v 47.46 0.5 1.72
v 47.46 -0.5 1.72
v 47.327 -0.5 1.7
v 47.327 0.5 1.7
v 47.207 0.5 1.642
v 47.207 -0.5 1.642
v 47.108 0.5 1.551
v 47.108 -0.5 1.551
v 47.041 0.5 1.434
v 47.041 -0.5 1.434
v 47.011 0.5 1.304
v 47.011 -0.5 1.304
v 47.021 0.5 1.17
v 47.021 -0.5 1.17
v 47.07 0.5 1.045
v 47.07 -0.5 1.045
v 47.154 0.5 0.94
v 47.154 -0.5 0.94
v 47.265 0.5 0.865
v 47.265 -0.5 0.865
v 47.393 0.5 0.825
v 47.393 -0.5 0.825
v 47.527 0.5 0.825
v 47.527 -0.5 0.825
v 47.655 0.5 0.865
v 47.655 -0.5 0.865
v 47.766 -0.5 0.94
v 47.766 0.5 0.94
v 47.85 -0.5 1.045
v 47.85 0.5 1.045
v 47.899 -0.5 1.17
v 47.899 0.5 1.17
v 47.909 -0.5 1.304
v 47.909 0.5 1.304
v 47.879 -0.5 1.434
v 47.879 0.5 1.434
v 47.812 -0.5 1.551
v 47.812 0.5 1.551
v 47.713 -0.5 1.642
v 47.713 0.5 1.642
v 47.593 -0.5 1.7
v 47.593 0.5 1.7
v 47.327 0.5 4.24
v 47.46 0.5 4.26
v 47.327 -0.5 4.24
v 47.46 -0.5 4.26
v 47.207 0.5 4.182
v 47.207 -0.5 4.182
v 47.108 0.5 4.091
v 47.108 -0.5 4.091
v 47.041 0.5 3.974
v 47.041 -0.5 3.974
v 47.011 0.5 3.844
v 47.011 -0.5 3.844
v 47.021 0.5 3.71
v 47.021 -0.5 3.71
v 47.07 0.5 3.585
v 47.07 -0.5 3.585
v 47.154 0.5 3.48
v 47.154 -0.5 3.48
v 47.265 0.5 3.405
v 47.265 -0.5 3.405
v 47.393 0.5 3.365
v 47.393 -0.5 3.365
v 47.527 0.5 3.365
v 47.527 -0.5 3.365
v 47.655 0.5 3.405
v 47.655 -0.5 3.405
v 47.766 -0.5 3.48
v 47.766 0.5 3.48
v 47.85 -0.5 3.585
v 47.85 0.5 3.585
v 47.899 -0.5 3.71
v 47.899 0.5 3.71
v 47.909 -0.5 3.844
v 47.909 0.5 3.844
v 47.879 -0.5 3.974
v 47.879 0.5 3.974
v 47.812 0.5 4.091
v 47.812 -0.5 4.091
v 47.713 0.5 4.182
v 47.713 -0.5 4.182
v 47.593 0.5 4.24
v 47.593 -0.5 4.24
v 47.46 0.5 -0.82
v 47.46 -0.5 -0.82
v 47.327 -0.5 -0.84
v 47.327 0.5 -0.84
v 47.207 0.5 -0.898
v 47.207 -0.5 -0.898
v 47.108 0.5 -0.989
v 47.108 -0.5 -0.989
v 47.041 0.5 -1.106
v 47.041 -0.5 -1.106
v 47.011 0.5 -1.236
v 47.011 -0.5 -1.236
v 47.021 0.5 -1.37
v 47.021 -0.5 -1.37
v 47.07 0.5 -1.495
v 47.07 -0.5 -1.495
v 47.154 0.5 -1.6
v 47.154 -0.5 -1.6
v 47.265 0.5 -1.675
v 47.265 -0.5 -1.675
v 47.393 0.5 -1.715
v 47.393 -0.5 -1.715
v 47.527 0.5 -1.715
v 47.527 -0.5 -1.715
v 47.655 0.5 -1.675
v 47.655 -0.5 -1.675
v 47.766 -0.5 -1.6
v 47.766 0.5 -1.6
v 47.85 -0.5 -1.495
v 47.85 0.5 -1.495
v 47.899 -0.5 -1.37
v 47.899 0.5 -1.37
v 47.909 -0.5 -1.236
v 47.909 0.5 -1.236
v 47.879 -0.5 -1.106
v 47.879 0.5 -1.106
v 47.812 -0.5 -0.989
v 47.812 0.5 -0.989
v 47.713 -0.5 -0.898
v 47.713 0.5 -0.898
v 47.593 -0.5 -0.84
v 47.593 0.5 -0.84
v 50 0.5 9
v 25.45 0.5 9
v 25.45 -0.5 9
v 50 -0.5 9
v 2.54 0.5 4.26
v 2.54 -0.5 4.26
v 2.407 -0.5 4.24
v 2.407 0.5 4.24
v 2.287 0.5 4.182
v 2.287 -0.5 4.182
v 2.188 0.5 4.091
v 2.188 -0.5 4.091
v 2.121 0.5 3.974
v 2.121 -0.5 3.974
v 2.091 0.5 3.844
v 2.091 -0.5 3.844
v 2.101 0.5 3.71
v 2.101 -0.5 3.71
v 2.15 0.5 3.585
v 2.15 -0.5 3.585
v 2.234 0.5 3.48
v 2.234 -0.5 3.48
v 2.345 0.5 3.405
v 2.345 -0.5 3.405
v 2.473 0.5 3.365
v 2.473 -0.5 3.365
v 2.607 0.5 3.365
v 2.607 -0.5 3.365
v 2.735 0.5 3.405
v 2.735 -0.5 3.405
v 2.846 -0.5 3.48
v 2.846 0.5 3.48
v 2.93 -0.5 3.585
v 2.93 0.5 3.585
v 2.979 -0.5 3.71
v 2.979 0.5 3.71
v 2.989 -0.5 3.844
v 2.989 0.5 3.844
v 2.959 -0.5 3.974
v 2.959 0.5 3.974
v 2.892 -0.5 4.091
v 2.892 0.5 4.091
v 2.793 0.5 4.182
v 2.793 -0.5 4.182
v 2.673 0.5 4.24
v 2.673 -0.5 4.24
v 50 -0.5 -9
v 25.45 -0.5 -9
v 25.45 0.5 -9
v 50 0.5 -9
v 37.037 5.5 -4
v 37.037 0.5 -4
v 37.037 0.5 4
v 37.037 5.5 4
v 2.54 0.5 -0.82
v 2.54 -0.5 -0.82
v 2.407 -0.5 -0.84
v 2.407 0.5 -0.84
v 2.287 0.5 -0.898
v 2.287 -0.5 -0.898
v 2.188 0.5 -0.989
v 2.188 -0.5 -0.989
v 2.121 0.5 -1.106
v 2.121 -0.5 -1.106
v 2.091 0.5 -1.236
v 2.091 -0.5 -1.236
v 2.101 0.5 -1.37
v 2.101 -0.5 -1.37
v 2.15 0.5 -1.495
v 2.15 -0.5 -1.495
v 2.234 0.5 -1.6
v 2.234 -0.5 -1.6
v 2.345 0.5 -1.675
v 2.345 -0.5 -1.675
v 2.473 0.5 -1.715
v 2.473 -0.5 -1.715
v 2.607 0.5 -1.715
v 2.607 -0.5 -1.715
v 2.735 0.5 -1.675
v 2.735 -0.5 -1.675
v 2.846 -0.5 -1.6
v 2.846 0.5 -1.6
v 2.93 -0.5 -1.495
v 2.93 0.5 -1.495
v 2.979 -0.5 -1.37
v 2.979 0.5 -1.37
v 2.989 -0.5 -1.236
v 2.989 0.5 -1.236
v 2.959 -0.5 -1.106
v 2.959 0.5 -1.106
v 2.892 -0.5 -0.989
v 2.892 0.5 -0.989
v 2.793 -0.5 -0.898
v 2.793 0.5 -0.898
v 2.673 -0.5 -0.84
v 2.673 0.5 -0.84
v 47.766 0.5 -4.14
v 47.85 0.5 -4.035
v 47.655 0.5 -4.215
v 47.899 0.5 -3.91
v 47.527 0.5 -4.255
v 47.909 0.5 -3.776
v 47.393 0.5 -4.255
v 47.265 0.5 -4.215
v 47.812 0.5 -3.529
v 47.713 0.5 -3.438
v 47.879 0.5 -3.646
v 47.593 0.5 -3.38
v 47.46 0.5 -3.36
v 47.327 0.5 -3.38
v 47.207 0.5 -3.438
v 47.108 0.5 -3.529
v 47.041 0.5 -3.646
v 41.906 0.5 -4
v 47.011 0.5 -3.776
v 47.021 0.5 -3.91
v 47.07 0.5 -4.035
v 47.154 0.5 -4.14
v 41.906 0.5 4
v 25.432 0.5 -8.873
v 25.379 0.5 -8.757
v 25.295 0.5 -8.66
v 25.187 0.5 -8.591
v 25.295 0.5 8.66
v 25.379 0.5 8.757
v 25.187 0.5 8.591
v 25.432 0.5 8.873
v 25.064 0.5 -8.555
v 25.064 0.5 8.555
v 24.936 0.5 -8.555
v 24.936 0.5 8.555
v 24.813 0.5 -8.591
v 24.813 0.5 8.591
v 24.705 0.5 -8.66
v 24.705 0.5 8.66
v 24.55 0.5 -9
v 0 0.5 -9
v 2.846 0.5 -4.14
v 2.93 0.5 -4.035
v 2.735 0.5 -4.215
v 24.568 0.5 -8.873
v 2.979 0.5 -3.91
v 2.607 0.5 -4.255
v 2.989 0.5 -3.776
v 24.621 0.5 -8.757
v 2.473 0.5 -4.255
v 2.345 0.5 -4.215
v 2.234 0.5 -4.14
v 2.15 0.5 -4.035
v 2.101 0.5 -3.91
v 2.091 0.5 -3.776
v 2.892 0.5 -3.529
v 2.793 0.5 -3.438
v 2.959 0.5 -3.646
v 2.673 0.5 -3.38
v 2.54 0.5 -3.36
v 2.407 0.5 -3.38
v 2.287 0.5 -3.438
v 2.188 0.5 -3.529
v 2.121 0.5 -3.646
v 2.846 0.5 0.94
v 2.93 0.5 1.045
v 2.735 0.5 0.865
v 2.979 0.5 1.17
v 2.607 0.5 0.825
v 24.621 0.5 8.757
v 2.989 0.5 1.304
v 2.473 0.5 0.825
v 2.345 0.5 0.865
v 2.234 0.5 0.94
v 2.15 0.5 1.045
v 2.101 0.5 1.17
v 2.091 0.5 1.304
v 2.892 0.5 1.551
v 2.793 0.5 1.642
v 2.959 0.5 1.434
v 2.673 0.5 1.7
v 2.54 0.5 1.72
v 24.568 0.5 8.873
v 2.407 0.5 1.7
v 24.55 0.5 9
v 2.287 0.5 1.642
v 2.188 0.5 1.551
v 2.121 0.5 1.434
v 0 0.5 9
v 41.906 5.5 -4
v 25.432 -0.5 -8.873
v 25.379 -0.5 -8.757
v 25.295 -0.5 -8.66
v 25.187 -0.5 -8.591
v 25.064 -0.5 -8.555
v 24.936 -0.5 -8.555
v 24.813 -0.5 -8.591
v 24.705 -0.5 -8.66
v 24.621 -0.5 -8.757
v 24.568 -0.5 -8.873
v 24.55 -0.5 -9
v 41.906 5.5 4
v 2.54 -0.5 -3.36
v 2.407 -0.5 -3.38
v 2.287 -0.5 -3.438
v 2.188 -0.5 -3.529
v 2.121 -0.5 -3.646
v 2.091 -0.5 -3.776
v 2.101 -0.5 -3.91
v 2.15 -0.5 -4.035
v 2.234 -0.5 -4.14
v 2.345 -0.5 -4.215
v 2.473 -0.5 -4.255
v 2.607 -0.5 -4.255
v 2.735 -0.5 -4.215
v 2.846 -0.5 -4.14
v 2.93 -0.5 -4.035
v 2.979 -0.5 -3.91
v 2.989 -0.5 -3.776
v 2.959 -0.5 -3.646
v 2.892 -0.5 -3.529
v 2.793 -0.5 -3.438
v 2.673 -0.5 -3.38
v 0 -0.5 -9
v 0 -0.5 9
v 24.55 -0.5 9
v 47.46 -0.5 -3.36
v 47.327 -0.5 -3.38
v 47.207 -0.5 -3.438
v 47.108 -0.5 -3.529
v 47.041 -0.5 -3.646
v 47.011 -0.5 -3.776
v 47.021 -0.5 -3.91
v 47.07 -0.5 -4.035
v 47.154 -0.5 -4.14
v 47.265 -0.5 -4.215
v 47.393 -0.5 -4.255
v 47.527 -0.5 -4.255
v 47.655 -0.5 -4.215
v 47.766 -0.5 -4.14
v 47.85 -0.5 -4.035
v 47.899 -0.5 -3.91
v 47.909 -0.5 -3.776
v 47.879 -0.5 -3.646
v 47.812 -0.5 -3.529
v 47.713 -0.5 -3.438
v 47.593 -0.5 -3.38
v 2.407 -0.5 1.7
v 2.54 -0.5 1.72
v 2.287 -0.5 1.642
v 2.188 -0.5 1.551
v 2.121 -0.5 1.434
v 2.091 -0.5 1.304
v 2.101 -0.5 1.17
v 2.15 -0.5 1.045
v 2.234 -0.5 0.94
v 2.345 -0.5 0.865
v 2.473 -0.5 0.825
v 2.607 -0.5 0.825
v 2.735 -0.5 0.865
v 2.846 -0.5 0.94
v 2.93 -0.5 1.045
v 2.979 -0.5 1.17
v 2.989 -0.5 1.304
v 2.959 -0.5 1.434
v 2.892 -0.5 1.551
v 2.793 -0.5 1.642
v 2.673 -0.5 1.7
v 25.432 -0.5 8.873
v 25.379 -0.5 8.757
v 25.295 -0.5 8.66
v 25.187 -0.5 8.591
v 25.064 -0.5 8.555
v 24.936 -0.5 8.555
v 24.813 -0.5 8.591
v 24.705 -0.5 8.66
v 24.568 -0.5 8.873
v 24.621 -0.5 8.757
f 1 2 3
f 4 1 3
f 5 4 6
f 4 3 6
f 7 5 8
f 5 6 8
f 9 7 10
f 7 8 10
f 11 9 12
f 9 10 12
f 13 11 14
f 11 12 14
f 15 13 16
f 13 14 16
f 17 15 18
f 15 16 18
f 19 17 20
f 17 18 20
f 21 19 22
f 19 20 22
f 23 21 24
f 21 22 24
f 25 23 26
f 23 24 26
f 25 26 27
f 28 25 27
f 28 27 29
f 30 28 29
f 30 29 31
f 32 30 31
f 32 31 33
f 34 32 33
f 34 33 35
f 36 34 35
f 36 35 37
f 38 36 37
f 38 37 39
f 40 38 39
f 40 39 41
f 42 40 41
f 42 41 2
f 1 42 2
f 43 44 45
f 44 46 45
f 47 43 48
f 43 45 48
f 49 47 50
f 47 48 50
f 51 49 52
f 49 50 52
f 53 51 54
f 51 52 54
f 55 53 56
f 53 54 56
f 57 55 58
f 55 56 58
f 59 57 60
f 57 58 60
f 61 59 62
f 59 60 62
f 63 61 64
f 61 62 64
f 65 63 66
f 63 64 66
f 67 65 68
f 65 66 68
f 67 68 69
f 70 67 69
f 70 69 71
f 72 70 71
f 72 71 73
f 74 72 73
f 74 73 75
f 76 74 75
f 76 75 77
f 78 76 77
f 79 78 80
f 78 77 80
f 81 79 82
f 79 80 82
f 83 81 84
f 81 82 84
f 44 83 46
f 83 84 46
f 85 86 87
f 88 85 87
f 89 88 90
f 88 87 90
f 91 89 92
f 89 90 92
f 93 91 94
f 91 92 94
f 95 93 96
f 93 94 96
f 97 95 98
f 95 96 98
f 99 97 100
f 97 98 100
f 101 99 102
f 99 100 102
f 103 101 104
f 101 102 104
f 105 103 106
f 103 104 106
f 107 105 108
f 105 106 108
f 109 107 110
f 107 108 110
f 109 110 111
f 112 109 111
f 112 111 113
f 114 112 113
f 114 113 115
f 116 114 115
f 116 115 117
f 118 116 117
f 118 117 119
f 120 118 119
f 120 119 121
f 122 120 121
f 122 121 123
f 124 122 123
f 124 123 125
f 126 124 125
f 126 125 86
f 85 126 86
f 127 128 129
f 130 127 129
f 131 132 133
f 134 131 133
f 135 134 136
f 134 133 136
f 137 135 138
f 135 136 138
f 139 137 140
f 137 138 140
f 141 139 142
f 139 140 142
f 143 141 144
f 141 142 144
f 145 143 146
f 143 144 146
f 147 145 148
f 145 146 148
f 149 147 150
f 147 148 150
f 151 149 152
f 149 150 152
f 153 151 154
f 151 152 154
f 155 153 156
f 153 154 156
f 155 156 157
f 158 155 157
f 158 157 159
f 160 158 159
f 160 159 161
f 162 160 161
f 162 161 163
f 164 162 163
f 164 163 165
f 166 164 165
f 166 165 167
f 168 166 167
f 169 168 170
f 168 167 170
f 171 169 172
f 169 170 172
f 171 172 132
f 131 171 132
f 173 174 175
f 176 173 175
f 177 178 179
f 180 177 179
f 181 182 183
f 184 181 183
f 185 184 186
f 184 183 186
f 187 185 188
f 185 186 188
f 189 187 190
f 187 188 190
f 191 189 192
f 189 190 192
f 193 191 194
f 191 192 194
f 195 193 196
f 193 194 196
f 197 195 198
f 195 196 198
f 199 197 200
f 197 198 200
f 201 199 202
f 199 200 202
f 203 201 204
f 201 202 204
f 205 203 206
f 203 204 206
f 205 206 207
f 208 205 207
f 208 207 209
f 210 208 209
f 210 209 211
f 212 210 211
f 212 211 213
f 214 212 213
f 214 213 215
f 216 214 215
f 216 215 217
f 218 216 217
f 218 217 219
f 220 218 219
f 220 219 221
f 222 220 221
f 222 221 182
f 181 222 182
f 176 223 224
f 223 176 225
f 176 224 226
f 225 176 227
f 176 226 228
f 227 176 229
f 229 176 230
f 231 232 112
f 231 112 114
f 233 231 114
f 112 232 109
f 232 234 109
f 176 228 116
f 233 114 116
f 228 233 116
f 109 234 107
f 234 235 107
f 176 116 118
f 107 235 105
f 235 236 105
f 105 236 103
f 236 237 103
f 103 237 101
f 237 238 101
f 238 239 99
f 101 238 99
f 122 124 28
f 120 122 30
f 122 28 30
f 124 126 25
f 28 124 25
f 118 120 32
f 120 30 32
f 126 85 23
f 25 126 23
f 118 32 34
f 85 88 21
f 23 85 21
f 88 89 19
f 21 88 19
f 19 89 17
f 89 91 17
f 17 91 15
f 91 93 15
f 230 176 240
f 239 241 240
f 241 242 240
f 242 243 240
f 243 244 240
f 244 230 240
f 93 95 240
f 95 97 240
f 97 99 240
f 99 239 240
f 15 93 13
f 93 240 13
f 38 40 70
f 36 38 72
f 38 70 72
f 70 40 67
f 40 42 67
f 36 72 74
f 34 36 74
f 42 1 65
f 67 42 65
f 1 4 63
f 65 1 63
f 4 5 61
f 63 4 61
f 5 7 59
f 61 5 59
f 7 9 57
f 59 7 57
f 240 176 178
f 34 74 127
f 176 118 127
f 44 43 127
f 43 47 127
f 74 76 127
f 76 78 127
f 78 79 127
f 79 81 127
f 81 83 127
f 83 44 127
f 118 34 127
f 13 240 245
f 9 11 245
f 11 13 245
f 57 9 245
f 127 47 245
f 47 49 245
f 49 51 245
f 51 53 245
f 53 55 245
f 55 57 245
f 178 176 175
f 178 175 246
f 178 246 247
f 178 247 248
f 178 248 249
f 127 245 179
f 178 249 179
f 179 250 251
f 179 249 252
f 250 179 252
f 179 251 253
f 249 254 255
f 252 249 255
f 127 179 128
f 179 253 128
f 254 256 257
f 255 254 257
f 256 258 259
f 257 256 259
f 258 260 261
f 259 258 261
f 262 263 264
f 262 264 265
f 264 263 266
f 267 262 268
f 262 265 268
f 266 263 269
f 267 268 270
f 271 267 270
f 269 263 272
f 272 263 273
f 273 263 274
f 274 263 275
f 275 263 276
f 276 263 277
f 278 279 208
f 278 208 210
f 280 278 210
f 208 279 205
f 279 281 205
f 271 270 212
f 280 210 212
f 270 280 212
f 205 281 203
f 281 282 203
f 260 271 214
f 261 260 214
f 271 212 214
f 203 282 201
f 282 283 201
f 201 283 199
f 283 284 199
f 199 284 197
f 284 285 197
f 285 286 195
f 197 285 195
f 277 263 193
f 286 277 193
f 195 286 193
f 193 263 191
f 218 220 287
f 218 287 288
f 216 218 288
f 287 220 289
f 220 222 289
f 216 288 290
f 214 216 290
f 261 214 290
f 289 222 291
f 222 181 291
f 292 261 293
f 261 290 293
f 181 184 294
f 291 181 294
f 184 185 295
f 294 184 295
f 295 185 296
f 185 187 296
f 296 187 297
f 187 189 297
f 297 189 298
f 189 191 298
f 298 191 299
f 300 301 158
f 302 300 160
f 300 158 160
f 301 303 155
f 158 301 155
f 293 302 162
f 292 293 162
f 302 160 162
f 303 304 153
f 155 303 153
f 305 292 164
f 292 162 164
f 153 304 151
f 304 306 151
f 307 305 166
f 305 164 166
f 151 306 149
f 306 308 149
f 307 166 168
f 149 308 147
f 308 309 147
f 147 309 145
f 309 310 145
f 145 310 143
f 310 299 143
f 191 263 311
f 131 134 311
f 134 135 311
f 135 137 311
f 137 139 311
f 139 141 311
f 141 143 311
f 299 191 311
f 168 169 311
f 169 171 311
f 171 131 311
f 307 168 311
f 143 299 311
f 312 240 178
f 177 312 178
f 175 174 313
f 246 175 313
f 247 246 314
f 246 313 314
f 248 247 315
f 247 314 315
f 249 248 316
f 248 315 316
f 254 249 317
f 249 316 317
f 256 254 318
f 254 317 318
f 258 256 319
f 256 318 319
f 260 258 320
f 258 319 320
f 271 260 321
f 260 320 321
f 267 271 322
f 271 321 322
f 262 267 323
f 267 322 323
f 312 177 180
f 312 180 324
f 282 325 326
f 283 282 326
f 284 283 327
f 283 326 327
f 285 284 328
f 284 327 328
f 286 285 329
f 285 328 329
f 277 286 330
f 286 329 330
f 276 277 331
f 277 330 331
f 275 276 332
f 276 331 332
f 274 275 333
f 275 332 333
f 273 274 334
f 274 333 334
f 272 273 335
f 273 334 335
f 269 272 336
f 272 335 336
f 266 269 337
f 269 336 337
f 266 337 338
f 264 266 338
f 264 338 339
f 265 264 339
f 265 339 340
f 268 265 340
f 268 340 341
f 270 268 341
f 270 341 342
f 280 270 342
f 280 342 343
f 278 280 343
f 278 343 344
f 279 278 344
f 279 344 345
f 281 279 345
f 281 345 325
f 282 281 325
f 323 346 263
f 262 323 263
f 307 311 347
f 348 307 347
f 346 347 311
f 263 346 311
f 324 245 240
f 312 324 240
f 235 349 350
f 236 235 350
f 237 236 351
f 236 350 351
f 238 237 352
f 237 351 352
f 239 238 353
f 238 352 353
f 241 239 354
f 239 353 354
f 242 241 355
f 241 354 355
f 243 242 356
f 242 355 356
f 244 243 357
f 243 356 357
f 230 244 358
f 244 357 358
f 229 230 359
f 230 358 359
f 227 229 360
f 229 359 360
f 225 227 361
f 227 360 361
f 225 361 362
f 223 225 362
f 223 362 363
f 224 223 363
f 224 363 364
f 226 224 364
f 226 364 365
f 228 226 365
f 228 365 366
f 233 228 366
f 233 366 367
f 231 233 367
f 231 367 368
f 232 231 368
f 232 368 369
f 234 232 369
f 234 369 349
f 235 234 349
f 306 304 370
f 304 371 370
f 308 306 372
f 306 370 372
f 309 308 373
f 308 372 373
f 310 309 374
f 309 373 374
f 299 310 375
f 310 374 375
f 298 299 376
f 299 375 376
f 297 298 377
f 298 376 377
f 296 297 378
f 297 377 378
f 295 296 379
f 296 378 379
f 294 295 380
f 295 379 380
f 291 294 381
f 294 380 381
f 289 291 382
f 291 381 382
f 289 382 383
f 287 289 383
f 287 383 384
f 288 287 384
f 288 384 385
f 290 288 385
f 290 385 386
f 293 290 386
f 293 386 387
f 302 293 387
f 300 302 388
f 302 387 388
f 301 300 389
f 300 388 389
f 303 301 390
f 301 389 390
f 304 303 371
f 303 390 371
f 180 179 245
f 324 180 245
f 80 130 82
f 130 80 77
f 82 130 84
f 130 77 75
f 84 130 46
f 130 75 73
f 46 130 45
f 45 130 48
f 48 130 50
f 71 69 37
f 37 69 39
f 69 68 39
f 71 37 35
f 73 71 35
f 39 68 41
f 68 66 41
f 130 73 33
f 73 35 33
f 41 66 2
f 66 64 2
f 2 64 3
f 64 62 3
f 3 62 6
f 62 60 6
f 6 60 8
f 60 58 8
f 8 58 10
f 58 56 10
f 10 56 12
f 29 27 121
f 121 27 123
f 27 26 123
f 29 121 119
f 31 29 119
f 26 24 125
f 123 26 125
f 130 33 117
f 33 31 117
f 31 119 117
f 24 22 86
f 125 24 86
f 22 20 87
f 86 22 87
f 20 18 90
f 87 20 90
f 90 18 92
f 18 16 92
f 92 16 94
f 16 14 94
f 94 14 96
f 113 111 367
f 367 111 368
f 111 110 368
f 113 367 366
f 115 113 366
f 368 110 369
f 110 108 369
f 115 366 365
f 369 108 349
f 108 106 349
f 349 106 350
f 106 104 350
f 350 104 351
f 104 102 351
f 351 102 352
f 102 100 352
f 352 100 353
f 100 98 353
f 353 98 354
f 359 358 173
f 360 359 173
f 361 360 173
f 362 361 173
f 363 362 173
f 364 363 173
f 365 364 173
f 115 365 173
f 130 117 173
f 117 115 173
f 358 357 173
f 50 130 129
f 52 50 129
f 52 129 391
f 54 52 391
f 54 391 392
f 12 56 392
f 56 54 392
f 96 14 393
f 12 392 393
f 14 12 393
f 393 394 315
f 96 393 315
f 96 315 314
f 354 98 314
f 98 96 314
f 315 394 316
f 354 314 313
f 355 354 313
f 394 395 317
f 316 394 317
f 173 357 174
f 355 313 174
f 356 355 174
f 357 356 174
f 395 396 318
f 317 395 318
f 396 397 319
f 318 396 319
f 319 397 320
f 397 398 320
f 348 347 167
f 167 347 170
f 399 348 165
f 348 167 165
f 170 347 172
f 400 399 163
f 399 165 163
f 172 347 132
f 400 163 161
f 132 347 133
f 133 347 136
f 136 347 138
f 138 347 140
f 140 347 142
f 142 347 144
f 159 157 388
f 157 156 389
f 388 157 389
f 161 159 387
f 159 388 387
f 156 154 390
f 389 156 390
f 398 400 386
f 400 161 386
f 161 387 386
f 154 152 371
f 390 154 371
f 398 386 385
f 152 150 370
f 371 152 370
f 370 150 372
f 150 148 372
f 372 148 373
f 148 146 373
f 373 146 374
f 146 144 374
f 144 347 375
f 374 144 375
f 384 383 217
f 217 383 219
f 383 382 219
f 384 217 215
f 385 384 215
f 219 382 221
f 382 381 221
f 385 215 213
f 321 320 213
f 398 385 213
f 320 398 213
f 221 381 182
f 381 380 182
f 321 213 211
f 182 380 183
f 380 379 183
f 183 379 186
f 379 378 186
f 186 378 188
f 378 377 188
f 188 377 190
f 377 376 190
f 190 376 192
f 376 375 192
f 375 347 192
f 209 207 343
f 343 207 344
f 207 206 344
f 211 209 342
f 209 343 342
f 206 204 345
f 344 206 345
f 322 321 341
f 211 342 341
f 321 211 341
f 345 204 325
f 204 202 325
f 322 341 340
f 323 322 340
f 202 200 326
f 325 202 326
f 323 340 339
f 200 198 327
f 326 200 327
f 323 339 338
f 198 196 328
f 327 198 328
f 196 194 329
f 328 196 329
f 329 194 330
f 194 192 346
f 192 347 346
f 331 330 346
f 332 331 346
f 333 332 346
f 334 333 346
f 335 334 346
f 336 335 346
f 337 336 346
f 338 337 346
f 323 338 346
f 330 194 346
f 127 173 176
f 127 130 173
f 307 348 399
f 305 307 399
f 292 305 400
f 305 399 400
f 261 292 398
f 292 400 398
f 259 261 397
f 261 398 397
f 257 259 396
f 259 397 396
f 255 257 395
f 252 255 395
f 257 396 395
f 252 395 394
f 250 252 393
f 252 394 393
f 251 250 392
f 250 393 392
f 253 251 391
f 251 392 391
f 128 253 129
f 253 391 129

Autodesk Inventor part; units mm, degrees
ref_plane "YZ Plane" through (0, 0, 0) normal (1, 0, 0) x (0, 1, 0)
ref_plane "XZ Plane" through (0, 0, 0) normal (0, 1, 0) x (-1, 0, 0)
ref_plane "XY Plane" through (0, 0, 0) normal (0, 0, 1) x (1, 0, 0)
sketch "Boceto1" plane through (0, 0, 0) normal (1, 0, 0) x (0, 1, 0)
  line L0 (0.5, 9) -> (-0.5, 9)
  line L1 (-0.5, 9) -> (-0.5, -9)
  line L2 (-0.5, -9) -> (0.5, -9)
  line L3 (0.5, -9) -> (0.5, 9)
  point P0 (0, 0)
  dimension "d0" = 1
  dimension "d1" = 18
  dimension "d2" = 9
  dimension "d3" = 0.5
extrude "Extrusión1" add sketch "Boceto1" along normal blind 50
sketch "Boceto2" plane through (0, 0.5, 9) normal (0, 1, 0) x (1, 0, 0)
  line L0 (0, 0) -> (50, 0) projected
  line L1 (0, 18) -> (50, 18) projected
  line L2 (0, 18) -> (0, 0) projected
  line L3 (25, 0) -> (25, 18)
  line L4 (0, 0) -> (50, 0) projected
  point P0 (0, 9)
  point P1 (2.54, 5.19)
  point P2 (2.54, 7.73)
  point P3 (2.54, 10.27)
  point P4 (2.54, 12.81)
  point P5 (47.46, 5.19)
  point P6 (47.46, 7.73)
  point P7 (47.46, 10.27)
  point P8 (47.46, 12.81)
  dimension "d6" = 5.19
  dimension "d8" = 2.54
  dimension "d9" = 2.54
  dimension "d10" = 2.54
  dimension "d11" = 2.54
hole "Agujero1" at (2.54, 0.5, 3.81) at (2.54, 0.5, 1.27) at (2.54, 0.5, -1.27) at (2.54, 0.5, -3.81) at (25, 0.5, 9) at (25, 0.5, -9) at (47.46, 0.5, -3.81) at (47.46, 0.5, -1.27) at (47.46, 0.5, 1.27) at (47.46, 0.5, 3.81) direction (0, -1, 0) diameter 0.9 end through all
sketch "Boceto3" plane through (0, 0.5, 9) normal (0, 1, 0) x (1, 0, 0)
  line L0 (37.0371, 5) -> (41.9064, 5)
  line L1 (41.9064, 5) -> (41.9064, 13)
  line L2 (41.9064, 13) -> (37.0371, 13)
  line L3 (37.0371, 13) -> (37.0371, 5)
  line L4 (25.45, 0) -> (50, 0) projected
  line L5 (25.45, 18) -> (50, 18) projected
  point P0 (0, 9)
  dimension "d19" = 5
  dimension "d20" = 5
extrude "Extrusión2" add sketch "Boceto3" along normal blind 5
properties part number "MAX485"
